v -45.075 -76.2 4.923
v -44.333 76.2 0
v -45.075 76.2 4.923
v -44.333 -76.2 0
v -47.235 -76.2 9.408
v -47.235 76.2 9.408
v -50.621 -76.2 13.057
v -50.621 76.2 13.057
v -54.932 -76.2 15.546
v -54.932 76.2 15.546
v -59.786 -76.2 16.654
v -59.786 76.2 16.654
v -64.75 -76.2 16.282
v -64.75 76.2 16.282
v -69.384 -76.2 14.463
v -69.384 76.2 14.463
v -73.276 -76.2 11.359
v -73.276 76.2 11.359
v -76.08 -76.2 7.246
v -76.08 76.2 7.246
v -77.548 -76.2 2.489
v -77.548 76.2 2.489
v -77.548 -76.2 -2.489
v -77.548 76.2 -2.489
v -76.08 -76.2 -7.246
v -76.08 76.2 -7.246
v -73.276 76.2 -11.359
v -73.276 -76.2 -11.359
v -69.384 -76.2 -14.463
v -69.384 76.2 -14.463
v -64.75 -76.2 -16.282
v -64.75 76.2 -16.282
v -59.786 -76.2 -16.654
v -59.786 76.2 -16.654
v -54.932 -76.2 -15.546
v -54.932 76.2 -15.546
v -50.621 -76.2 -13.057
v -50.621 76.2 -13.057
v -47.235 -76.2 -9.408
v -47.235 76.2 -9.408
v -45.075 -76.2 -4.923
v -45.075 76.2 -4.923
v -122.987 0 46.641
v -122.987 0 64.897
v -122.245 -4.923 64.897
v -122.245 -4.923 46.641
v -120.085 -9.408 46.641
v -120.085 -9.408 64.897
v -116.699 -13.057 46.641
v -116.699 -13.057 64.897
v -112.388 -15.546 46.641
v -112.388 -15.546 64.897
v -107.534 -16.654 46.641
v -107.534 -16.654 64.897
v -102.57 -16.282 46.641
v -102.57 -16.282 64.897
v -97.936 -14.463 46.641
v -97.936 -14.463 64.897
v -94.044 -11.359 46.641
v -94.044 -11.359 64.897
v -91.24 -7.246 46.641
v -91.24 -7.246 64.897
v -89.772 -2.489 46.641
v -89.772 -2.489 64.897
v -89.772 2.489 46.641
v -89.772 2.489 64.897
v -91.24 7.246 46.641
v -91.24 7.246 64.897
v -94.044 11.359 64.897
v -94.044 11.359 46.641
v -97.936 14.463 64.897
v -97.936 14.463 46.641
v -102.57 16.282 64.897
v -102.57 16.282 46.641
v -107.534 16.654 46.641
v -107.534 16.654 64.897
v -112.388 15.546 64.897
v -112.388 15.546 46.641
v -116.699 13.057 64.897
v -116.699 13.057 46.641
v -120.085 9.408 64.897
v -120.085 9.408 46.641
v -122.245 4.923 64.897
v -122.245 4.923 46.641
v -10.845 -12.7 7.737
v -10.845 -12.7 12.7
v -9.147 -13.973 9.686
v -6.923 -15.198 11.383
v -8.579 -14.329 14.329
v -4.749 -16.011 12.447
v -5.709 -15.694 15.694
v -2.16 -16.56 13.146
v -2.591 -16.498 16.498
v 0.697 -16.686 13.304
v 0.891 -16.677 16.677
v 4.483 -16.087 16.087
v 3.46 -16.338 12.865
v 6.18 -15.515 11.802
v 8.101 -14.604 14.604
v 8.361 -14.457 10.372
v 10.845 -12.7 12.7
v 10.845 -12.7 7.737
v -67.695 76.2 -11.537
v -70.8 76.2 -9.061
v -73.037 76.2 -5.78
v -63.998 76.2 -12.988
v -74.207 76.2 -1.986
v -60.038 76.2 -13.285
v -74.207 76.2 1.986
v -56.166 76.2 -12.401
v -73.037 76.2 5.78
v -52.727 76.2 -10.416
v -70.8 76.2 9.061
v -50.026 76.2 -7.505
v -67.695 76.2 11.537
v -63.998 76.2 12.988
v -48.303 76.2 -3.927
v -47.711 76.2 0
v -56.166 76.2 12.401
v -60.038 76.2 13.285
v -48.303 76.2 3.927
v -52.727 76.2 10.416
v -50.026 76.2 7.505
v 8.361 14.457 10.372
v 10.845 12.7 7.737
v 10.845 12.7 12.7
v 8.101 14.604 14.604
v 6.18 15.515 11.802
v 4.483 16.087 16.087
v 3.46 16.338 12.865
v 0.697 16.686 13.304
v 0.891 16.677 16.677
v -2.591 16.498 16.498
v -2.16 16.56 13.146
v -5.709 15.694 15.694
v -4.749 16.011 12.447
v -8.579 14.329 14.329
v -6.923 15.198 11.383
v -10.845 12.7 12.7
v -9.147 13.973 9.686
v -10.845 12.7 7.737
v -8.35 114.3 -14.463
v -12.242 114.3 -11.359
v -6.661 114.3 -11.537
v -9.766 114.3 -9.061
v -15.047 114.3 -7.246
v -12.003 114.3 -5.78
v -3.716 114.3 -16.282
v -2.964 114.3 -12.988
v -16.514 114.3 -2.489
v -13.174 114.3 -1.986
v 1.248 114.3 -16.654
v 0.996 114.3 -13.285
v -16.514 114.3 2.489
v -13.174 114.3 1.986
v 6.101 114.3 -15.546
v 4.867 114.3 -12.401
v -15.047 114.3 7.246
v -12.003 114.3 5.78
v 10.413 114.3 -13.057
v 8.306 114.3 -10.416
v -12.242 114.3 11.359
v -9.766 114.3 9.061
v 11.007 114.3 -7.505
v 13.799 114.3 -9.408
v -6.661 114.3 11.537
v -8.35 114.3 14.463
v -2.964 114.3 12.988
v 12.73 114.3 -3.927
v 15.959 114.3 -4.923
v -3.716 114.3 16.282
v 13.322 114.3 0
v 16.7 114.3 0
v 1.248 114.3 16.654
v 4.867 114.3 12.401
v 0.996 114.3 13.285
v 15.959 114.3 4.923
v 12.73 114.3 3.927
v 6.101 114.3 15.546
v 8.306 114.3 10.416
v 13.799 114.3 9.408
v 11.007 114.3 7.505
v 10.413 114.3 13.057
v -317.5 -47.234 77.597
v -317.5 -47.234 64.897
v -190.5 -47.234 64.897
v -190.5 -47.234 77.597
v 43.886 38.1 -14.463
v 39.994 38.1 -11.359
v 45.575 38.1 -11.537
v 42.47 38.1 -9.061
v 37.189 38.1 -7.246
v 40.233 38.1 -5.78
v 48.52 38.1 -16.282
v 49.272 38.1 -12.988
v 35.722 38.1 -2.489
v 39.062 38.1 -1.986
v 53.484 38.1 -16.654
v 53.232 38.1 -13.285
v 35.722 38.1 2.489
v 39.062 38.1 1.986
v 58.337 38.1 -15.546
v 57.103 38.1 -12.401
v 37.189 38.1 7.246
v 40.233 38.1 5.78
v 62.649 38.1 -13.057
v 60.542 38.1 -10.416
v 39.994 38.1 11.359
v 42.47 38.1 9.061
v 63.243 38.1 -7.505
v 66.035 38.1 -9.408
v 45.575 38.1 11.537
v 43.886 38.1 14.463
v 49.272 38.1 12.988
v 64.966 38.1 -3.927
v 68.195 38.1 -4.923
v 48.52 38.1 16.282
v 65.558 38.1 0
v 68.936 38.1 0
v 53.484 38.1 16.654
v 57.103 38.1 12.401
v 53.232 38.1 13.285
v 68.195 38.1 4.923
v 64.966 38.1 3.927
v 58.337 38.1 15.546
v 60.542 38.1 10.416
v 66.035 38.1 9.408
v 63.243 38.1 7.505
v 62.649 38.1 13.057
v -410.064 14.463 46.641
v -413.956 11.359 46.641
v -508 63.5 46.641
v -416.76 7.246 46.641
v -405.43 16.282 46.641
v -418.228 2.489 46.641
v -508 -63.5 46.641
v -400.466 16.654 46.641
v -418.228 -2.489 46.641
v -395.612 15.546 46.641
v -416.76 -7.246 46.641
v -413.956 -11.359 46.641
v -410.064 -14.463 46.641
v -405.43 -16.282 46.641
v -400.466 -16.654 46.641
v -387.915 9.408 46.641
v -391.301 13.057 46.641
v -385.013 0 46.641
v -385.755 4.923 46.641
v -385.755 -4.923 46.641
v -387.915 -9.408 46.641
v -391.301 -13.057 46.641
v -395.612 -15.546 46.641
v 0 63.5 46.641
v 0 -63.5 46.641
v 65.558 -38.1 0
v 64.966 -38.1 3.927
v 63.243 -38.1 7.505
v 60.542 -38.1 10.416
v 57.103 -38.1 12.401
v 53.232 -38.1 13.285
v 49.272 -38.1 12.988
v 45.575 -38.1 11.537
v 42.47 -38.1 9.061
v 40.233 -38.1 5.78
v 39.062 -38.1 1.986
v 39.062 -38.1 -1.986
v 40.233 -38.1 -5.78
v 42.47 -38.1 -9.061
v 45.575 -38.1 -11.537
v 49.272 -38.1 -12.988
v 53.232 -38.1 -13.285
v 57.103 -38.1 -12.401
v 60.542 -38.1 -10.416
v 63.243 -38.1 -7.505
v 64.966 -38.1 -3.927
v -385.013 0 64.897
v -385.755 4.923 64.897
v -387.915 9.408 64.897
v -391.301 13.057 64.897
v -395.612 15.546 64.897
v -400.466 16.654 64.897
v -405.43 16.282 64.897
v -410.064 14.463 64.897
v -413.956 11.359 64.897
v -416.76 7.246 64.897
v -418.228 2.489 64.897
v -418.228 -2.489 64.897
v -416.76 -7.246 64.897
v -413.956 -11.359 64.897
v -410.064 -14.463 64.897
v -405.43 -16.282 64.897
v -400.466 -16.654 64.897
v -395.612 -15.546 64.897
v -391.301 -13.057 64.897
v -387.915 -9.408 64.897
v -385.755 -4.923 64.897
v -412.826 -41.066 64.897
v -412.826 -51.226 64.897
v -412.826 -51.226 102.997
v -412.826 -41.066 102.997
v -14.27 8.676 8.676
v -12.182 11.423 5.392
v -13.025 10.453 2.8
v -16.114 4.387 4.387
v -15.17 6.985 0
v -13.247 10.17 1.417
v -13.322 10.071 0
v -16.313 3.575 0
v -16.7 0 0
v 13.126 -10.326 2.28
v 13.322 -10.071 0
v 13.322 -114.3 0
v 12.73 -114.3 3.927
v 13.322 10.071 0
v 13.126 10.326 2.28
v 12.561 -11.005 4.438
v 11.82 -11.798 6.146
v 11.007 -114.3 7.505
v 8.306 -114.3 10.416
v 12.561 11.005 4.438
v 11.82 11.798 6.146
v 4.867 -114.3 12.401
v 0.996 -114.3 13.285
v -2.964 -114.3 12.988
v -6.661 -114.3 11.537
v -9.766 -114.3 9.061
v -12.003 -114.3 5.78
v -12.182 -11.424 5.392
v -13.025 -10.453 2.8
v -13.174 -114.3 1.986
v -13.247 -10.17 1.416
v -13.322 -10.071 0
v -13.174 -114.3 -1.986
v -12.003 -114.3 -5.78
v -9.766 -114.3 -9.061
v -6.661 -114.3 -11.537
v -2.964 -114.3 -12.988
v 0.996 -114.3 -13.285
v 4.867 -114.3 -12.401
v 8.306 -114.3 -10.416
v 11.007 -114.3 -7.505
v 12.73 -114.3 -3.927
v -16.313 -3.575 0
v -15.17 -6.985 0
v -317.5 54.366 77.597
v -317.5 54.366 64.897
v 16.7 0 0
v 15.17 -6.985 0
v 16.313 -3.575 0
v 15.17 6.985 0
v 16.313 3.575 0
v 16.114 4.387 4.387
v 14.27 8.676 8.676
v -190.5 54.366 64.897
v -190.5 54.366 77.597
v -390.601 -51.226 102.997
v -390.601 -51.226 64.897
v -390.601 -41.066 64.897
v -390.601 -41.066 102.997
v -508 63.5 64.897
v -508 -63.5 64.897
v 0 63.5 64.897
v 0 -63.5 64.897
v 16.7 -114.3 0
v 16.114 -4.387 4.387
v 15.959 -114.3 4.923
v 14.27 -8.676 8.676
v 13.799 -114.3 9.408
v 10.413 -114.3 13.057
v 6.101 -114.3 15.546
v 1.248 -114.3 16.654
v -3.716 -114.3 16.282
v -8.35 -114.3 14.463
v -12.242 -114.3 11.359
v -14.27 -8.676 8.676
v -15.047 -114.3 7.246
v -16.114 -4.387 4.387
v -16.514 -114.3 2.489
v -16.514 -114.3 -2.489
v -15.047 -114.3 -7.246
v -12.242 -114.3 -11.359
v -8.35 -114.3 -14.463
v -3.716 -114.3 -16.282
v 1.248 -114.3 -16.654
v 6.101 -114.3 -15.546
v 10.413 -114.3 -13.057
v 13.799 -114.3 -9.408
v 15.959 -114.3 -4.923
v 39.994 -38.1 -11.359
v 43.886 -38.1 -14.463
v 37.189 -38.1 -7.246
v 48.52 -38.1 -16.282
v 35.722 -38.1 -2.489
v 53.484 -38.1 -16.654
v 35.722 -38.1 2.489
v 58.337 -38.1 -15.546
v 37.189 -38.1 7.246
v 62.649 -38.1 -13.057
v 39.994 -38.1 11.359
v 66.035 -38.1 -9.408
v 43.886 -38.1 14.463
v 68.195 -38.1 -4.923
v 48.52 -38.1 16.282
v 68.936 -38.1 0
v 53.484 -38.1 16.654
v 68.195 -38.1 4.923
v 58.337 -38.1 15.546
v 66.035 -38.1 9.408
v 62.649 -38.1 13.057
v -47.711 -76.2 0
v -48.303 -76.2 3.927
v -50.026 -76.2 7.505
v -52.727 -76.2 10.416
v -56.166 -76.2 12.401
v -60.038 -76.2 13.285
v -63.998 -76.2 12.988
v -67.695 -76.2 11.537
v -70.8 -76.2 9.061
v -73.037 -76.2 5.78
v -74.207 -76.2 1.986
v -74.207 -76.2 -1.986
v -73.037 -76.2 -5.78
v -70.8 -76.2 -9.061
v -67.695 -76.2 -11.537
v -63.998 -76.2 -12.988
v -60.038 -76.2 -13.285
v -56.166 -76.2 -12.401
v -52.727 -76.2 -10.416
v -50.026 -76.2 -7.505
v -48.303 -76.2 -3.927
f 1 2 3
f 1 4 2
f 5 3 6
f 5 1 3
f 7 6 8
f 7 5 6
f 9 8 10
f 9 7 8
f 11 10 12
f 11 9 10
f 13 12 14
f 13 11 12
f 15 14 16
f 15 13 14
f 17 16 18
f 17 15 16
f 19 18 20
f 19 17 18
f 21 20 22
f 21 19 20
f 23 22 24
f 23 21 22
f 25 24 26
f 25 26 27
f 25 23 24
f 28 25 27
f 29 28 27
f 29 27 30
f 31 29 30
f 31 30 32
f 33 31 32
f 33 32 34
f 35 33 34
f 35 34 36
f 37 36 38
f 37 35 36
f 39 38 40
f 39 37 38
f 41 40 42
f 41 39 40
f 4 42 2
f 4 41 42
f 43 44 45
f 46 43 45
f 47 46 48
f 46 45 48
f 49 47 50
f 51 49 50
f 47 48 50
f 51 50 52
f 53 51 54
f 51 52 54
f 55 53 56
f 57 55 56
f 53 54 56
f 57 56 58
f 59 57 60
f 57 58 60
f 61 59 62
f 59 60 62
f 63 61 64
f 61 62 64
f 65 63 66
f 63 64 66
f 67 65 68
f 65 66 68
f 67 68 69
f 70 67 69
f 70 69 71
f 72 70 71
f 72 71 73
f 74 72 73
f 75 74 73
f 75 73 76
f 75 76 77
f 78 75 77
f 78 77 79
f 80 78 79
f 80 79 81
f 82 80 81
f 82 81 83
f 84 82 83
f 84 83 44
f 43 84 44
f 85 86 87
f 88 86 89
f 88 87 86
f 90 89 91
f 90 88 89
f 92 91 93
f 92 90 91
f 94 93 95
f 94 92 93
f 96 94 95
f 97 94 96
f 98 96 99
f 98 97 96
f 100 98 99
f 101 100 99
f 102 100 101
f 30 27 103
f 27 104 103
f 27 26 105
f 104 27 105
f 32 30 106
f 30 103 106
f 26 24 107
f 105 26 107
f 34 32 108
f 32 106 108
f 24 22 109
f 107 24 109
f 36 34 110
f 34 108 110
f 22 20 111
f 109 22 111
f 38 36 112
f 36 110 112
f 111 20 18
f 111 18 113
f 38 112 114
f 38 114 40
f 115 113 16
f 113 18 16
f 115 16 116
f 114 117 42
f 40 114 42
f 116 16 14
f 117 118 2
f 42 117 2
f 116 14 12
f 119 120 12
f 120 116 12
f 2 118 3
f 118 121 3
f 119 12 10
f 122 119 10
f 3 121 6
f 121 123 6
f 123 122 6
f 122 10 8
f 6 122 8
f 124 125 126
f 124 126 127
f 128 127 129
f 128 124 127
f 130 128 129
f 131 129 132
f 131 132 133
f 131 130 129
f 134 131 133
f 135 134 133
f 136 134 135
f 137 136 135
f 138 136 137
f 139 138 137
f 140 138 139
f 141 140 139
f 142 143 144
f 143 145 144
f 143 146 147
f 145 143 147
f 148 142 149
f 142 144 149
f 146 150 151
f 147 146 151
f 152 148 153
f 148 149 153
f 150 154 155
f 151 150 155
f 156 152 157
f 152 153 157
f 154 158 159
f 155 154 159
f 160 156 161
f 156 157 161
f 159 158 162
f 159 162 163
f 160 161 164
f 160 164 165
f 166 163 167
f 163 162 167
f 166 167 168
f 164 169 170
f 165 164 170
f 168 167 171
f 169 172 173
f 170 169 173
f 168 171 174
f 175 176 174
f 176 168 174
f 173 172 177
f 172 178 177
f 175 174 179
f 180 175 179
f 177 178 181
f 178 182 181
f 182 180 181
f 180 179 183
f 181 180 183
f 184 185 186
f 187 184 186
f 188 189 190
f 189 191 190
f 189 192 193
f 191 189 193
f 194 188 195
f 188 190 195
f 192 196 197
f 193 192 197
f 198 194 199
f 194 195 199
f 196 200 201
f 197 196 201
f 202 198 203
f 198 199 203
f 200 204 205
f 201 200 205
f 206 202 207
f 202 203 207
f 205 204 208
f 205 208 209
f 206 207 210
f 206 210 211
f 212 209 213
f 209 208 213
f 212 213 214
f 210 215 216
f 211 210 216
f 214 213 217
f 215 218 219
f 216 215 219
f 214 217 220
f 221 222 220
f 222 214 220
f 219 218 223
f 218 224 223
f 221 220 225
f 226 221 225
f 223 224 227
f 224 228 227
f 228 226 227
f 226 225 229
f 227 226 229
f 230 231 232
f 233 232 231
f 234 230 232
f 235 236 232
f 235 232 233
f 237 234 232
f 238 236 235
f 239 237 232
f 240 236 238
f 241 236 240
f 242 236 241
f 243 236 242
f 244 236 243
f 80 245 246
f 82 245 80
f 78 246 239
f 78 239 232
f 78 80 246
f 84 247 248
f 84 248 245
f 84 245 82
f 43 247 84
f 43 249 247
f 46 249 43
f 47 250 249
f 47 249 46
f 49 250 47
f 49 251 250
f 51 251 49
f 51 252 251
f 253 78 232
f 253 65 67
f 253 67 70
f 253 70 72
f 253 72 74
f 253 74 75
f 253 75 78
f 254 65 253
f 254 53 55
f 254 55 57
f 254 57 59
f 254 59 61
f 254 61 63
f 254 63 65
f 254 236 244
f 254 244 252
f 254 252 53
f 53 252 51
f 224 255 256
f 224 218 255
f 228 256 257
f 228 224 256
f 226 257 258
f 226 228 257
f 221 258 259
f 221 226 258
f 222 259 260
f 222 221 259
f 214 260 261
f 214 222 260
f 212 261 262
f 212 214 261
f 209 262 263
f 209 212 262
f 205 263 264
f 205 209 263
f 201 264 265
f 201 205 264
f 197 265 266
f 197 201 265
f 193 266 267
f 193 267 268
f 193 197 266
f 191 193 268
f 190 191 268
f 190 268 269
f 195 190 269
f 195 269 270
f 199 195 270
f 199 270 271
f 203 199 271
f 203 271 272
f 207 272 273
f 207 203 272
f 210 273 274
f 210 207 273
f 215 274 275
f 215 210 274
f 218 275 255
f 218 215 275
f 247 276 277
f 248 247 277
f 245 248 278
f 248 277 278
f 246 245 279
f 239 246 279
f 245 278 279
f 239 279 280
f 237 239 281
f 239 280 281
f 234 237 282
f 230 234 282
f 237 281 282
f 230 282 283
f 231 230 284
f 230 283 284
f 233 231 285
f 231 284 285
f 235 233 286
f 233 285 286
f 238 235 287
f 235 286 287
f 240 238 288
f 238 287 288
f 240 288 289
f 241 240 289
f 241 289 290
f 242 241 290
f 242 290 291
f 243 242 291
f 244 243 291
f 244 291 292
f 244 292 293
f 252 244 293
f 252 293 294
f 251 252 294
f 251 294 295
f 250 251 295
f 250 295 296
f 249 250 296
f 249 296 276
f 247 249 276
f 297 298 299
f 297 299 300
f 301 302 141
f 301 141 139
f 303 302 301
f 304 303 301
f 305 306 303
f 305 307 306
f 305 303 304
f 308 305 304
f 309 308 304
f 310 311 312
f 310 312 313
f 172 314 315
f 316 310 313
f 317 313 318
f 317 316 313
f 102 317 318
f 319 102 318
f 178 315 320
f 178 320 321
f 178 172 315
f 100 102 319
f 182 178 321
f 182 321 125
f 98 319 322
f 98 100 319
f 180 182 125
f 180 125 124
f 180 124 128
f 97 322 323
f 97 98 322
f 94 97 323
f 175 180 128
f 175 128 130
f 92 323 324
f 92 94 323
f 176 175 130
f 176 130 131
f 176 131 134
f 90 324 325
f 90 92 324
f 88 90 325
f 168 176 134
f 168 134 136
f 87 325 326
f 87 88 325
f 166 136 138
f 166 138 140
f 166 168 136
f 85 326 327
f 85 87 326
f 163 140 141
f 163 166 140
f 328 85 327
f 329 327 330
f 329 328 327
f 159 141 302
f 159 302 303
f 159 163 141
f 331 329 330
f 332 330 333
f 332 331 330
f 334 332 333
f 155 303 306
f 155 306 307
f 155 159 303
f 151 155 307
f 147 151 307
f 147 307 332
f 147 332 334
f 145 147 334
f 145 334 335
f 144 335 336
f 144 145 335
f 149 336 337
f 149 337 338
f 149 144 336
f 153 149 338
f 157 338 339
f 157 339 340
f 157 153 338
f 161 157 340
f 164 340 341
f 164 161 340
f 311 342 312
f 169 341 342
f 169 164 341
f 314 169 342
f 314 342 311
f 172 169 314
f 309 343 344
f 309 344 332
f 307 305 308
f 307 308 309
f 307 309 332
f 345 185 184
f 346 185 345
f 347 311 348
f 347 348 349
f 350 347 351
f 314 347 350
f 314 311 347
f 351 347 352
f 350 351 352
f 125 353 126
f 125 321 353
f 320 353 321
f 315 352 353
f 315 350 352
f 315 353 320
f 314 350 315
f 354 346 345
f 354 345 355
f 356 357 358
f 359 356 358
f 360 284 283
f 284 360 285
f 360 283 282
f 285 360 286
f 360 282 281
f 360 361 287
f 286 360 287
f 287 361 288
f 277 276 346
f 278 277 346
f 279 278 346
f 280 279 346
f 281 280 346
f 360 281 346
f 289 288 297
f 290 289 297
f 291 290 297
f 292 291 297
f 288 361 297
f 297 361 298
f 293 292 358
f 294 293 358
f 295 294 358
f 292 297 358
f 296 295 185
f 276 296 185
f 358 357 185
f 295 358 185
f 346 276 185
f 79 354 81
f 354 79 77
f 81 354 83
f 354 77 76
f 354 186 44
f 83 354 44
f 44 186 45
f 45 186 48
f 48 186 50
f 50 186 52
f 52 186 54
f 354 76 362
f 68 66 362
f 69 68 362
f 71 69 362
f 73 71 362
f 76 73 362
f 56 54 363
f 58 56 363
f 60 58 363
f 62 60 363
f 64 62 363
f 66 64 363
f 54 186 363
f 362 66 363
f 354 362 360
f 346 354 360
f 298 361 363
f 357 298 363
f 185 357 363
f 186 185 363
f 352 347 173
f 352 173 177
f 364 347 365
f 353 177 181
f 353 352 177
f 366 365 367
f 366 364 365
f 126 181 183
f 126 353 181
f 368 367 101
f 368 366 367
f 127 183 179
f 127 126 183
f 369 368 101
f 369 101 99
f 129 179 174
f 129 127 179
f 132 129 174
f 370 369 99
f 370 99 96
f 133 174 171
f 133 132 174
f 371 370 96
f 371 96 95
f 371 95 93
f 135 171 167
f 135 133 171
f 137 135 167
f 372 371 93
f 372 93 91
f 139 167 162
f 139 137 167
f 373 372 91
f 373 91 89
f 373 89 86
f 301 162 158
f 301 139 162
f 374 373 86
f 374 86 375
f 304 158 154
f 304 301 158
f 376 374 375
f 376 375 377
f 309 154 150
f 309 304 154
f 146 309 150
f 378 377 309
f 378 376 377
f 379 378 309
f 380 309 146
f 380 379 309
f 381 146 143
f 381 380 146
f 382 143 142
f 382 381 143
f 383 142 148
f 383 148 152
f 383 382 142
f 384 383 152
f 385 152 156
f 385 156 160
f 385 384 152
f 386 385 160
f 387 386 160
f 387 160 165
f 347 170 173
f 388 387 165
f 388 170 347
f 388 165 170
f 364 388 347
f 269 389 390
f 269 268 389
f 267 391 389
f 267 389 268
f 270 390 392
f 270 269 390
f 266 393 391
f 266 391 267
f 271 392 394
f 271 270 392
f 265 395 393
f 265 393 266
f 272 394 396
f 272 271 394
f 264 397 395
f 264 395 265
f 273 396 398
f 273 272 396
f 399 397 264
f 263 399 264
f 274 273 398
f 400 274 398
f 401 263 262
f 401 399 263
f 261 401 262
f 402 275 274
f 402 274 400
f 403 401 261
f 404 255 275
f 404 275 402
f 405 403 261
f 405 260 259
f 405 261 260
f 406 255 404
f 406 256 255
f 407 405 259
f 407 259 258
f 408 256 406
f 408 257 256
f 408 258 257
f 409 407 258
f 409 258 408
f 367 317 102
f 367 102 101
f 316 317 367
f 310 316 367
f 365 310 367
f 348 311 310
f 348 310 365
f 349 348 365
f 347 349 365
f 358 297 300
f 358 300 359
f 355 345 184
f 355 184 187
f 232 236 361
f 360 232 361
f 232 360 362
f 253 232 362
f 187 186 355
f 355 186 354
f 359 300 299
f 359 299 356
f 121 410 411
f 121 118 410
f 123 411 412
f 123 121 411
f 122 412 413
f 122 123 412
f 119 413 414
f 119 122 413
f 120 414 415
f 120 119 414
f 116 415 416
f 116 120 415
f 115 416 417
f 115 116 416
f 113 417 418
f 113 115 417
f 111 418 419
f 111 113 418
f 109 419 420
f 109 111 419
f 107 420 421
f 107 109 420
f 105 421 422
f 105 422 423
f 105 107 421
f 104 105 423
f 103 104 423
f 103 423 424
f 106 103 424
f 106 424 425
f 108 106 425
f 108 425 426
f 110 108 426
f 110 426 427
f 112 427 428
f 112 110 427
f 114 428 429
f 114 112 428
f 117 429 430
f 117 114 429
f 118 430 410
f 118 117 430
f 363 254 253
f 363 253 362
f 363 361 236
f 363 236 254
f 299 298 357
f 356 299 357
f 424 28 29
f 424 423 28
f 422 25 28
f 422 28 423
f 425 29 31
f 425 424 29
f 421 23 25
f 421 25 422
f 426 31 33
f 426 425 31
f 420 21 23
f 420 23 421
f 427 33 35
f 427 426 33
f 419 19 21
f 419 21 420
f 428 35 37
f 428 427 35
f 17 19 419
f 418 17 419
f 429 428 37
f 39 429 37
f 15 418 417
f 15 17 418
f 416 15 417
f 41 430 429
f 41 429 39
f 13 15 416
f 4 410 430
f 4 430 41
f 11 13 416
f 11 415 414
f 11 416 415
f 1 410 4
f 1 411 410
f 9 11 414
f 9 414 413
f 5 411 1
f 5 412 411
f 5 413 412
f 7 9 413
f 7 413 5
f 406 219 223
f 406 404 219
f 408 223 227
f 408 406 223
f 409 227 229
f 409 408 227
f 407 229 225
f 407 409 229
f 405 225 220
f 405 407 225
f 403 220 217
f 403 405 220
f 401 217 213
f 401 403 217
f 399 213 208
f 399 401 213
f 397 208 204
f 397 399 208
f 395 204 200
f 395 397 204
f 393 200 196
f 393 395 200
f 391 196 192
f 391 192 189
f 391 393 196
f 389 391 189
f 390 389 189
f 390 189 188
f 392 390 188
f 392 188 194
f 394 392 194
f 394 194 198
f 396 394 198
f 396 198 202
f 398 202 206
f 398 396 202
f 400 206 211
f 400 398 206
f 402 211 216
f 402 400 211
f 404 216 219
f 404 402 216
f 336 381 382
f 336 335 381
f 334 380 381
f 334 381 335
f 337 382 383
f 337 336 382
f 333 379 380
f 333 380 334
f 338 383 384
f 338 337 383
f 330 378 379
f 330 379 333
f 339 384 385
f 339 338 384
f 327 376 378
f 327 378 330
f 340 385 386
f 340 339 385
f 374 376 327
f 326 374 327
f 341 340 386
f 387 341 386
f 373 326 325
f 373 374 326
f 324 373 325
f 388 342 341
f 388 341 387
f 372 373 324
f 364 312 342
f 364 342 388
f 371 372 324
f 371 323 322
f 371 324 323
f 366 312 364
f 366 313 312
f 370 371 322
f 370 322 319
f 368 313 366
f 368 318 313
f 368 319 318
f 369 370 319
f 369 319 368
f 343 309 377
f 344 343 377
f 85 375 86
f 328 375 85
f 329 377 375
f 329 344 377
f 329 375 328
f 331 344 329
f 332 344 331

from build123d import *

# Parameters (mm, degrees)
F0_R      = 16.7005
F0_R_2    = 13.3223
F1_DEPTH  = 76.2
F2_DEPTH  = 114.3
F3_DEPTH  = 38.1
F4_W      = 508
F4_H      = 18.25625
F5_DEPTH  = 63.5
F7_DEPTH  = 25.4
F8_R      = 16.7005
F9_DEPTH  = 25.4
F10_W     = 127
F10_H     = 101.6
F11_DEPTH = 12.7
F10_W_2   = 22.225
F10_H_2   = 10.16
F12_DEPTH = 38.1


with BuildPart() as f1:
    # F0 (on Front) → F1 (new body, symmetric)
    with BuildSketch(Plane.XZ):
        with Locations((-61.0336442519, 0)):
            Circle(F0_R)
        with Locations((-61.0336442519, 0)):
            Circle(F0_R_2, mode=Mode.SUBTRACT)
    extrude(amount=F1_DEPTH, both=True)


with BuildPart() as f2:
    # F0 (on Front) → F2 (new body, symmetric)
    with BuildSketch(Plane.XZ):
        Circle(F0_R)
        Circle(F0_R_2, mode=Mode.SUBTRACT)
    extrude(amount=F2_DEPTH, both=True)

    # F6 (on Top) → F7 (cut)
    with BuildSketch(Plane.XY):
        with BuildLine():
            ThreePointArc((10.8451233395, 12.7), (0, 16.7005), (-10.8451233395, 12.7))
            Line((-10.8451233395, 12.7), (10.8451233395, 12.7))
        make_face()
        with BuildLine():
            ThreePointArc((-16.7005, 0), (-15.166174247, -6.992414387), (-10.8451233395, -12.7))
            Line((-10.8451233395, -12.7), (10.8451233395, -12.7))
            ThreePointArc((10.8451233395, -12.7), (15.166174247, -6.992414387), (16.7005, 0))
            ThreePointArc((16.7005, 0), (15.166174247, 6.992414387), (10.8451233395, 12.7))
            Line((10.8451233395, 12.7), (-10.8451233395, 12.7))
            ThreePointArc((-10.8451233395, 12.7), (-15.166174247, 6.992414387), (-16.7005, 0))
        make_face()
        with BuildLine():
            Line((10.8451233395, -12.7), (-10.8451233395, -12.7))
            ThreePointArc((-10.8451233395, -12.7), (0, -16.7005), (10.8451233395, -12.7))
        make_face()
    extrude(amount=F7_DEPTH, mode=Mode.SUBTRACT)


with BuildPart() as f3:
    # F0 (on Front) → F3 (new body, symmetric)
    with BuildSketch(Plane.XZ):
        with Locations((52.2359970283, 0)):
            Circle(F0_R)
        with Locations((52.2359970283, 0)):
            Circle(F0_R_2, mode=Mode.SUBTRACT)
    extrude(amount=F3_DEPTH, both=True)


with BuildPart() as f5:
    # F4 (on Front) → F5 (new body, symmetric)
    with BuildSketch(Plane.XZ):
        with Locations((-254, 55.7688130877)):
            Rectangle(F4_W, F4_H)
    extrude(amount=F5_DEPTH, both=True)

    # F8 (on face) → F9 (cut)
    with BuildSketch(Plane.XY.offset(64.8969380877)):
        with BuildLine():
            ThreePointArc((-89.5858, 0), (-106.2863, 16.7005), (-122.9868, 0))
            ThreePointArc((-122.9868, 0), (-106.2863, -16.7005), (-89.5858, 0))
        make_face()
        with Locations((-401.7137, 0)):
            Circle(F8_R)
    extrude(amount=-F9_DEPTH, mode=Mode.SUBTRACT)

    # F10 (on face) → F11 (join)
    with BuildSketch(Plane.XY.offset(64.8969380877)):
        with Locations((-254, 3.5663377494)):
            Rectangle(F10_W, F10_H)
    extrude(amount=F11_DEPTH)

    # F10 (on face) → F12 (join)
    with BuildSketch(Plane.XY.offset(64.8969380877)):
        with Locations((-401.7137, -46.1455690992)):
            Rectangle(F10_W_2, F10_H_2)
    extrude(amount=F12_DEPTH)


solid = Compound([f1.part, f2.part, f3.part, f5.part])
